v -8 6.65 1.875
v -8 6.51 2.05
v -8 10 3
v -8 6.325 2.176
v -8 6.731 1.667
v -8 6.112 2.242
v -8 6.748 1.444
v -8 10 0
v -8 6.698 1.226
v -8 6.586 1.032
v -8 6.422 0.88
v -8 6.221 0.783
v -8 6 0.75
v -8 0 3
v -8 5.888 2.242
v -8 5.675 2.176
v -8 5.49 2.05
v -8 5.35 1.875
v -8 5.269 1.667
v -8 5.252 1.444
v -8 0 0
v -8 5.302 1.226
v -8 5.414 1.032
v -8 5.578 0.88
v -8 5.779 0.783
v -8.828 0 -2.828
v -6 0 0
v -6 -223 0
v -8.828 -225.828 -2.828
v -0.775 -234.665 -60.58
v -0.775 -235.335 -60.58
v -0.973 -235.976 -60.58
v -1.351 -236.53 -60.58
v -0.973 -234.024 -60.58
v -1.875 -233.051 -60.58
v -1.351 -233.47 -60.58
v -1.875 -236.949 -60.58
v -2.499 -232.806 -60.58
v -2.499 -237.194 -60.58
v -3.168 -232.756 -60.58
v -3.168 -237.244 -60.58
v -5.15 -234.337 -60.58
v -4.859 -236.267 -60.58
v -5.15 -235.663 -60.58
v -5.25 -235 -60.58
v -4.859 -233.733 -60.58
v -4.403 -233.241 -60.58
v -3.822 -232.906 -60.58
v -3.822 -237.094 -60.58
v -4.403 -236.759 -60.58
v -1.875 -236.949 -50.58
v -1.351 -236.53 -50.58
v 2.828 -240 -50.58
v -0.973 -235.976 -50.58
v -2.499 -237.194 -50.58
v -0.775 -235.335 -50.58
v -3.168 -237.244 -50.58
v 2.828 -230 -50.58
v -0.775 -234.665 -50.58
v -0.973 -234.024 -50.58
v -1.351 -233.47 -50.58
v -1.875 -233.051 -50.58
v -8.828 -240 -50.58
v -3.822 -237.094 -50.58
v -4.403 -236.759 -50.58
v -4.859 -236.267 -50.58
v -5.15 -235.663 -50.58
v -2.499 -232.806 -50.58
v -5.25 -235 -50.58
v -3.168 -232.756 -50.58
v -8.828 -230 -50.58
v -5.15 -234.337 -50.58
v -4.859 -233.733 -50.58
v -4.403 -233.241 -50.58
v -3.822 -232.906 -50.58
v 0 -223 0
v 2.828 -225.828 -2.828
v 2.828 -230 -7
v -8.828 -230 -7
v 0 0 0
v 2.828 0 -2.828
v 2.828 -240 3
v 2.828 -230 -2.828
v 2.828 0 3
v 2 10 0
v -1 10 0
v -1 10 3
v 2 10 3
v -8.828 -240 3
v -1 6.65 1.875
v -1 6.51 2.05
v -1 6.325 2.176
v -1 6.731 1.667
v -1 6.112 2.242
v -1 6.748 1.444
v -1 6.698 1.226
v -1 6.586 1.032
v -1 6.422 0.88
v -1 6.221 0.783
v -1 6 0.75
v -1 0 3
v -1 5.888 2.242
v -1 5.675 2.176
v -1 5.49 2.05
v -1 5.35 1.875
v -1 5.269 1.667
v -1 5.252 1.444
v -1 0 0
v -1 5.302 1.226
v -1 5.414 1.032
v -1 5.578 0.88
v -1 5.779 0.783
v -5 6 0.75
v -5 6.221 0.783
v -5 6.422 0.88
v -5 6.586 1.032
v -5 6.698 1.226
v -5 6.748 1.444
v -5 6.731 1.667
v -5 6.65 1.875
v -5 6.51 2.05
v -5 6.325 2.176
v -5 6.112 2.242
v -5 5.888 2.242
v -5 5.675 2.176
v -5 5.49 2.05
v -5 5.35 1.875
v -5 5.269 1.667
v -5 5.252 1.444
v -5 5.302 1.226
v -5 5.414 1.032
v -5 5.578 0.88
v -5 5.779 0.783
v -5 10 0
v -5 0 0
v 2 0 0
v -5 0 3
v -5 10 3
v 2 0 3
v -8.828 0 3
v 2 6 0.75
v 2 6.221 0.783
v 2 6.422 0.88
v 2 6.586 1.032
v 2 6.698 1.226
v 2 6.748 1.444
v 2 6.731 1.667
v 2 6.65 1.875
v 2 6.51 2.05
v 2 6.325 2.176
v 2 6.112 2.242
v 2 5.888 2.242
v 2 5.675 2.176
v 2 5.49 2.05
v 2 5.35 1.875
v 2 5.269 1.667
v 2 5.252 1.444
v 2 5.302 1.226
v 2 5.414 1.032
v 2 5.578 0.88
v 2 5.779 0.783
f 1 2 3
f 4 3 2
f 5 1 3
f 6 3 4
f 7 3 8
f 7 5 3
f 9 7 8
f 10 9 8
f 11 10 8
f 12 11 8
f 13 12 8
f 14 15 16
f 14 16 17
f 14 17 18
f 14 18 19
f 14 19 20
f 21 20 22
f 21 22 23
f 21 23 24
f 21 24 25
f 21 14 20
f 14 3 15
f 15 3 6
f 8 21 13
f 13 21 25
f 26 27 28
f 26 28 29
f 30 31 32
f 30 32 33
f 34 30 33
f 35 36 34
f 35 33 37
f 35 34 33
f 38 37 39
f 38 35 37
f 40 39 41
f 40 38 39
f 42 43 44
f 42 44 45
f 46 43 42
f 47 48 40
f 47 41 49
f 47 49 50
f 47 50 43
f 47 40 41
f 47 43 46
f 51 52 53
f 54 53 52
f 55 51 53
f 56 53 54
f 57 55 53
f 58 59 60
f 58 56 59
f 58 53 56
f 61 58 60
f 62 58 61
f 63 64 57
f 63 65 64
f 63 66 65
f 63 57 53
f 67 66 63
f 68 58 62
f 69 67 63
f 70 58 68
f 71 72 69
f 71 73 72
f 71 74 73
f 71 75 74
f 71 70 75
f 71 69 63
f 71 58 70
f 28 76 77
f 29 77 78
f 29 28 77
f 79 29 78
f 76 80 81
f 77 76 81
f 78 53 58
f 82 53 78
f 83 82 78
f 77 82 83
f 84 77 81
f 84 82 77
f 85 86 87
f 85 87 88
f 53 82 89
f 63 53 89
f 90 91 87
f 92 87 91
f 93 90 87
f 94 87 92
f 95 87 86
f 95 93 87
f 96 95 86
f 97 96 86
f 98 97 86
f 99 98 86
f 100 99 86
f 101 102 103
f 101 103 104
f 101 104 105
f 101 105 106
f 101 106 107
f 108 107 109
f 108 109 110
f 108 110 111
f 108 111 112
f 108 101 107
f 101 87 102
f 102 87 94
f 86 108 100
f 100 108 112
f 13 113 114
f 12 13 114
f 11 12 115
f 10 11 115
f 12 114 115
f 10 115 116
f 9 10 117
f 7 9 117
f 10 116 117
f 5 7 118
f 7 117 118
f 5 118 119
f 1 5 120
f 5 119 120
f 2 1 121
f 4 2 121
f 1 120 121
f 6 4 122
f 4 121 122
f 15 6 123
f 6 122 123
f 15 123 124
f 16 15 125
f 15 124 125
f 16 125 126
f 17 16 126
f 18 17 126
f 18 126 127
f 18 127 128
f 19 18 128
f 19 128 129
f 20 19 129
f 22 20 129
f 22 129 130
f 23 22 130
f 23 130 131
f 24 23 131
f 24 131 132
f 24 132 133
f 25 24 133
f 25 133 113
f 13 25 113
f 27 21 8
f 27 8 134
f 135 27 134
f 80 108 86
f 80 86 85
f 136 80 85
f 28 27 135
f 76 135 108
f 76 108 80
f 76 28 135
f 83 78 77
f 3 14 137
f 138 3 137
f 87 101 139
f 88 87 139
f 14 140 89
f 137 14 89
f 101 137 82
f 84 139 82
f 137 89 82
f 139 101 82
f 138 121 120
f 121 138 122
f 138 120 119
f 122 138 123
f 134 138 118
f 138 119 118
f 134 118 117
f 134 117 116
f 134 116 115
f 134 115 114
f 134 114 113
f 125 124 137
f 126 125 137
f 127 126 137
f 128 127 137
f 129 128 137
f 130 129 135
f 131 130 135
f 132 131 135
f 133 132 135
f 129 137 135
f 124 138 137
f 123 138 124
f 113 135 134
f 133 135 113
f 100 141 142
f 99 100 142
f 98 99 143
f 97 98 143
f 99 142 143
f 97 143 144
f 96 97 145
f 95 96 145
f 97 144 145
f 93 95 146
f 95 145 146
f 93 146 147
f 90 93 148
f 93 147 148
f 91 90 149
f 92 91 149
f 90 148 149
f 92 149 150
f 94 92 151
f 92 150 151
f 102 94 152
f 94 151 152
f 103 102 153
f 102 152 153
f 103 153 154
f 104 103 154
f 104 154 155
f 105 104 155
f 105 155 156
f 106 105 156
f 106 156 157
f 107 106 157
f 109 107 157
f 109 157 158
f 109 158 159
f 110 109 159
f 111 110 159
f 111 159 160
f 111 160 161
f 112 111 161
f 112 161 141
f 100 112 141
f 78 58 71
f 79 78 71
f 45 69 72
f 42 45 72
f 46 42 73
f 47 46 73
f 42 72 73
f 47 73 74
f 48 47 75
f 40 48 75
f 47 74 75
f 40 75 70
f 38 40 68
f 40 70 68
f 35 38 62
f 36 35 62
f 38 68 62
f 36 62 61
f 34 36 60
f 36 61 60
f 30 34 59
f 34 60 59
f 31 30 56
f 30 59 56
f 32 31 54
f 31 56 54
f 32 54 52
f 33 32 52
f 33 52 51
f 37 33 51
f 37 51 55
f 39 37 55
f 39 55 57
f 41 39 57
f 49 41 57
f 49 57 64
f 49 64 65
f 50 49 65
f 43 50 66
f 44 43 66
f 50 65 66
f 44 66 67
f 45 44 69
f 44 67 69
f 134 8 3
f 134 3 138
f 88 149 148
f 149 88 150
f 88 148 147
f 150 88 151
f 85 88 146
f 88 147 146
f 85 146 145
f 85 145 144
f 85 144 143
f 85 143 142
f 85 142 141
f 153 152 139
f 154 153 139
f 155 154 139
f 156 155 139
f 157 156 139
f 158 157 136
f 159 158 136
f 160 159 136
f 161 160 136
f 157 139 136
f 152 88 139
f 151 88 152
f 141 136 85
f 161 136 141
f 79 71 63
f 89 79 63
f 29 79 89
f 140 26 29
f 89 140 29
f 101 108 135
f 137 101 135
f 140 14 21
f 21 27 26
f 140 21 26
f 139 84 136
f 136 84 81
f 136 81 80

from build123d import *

# Parameters (mm, degrees)
SKETCH2_W           = 6
SKETCH2_H           = 240
BOSS_EXTRUDE1_DEPTH = 3
BOSS_EXTRUDE2_DEPTH = 240
SKETCH5_W           = 3
SKETCH5_H           = 3
BOSS_EXTRUDE3_DEPTH = 10
SKETCH6_R           = 0.75
CUT_EXTRUDE1_DEPTH  = 40
SKETCH7_W           = 11.65685425
SKETCH7_H           = 10
BOSS_EXTRUDE4_DEPTH = 50.58
SKETCH8_R           = 2.25
BOSS_EXTRUDE5_DEPTH = 10
BOSS_EXTRUDE6_DEPTH = 11.656854


with BuildPart() as part:
    # Sketch2 → Boss-Extrude1 (new body)
    with BuildSketch(Plane.XY):
        with Locations((-3, -120)):
            Rectangle(SKETCH2_W, SKETCH2_H)
    extrude(amount=BOSS_EXTRUDE1_DEPTH)

    # Sketch4 → Boss-Extrude2 (add)
    with BuildSketch(Plane(origin=(0, -240, 0), x_dir=(-1, 0, 0), z_dir=(0, -1, 0))):
        Polygon((0, 0), (-2.828427125, 2.828427125), (-2.828427125, -3), (0, -3), align=None)
        Polygon((8.828427125, -3), (6, -3), (6, 0), (8.828427125, 2.828427125), align=None)
    extrude(amount=-BOSS_EXTRUDE2_DEPTH)

    # Sketch5 → Boss-Extrude3 (add)
    with BuildSketch(Plane(origin=(0, 0, 0), x_dir=(1, 0, 0), z_dir=(0, 1, 0))):
        with Locations((-6.5, -1.5)):
            Rectangle(SKETCH5_W, SKETCH5_H)
        with Locations((0.5, -1.5)):
            Rectangle(SKETCH5_W, SKETCH5_H)
    extrude(amount=BOSS_EXTRUDE3_DEPTH)

    # Sketch6 → Cut-Extrude1 (cut)
    with BuildSketch(Plane(origin=(2, 0, 0), x_dir=(0, 0, -1), z_dir=(1, 0, 0))):
        with Locations((-1.5, 6)):
            Circle(SKETCH6_R)
    extrude(amount=-CUT_EXTRUDE1_DEPTH, mode=Mode.SUBTRACT)

    # Sketch7 → Boss-Extrude4 (add)
    with BuildSketch(Plane(origin=(0, 0, 0), x_dir=(-1, 0, 0), z_dir=(0, 0, -1))):
        with Locations((3, -235)):
            Rectangle(SKETCH7_W, SKETCH7_H)
    extrude(amount=BOSS_EXTRUDE4_DEPTH)

    # Sketch8 → Boss-Extrude5 (add)
    with BuildSketch(Plane(origin=(0, 0, -50.58), x_dir=(-1, 0, 0), z_dir=(0, 0, -1))):
        with Locations((3, -235)):
            Circle(SKETCH8_R)
    extrude(amount=BOSS_EXTRUDE5_DEPTH)

    # Sketch9 → Boss-Extrude6 (add)
    with BuildSketch(Plane.ZY.offset(8.828427125)):
        Polygon((-7, -230), (0, -230), (0, -223), align=None)
    extrude(amount=-BOSS_EXTRUDE6_DEPTH)


solid = part.part
